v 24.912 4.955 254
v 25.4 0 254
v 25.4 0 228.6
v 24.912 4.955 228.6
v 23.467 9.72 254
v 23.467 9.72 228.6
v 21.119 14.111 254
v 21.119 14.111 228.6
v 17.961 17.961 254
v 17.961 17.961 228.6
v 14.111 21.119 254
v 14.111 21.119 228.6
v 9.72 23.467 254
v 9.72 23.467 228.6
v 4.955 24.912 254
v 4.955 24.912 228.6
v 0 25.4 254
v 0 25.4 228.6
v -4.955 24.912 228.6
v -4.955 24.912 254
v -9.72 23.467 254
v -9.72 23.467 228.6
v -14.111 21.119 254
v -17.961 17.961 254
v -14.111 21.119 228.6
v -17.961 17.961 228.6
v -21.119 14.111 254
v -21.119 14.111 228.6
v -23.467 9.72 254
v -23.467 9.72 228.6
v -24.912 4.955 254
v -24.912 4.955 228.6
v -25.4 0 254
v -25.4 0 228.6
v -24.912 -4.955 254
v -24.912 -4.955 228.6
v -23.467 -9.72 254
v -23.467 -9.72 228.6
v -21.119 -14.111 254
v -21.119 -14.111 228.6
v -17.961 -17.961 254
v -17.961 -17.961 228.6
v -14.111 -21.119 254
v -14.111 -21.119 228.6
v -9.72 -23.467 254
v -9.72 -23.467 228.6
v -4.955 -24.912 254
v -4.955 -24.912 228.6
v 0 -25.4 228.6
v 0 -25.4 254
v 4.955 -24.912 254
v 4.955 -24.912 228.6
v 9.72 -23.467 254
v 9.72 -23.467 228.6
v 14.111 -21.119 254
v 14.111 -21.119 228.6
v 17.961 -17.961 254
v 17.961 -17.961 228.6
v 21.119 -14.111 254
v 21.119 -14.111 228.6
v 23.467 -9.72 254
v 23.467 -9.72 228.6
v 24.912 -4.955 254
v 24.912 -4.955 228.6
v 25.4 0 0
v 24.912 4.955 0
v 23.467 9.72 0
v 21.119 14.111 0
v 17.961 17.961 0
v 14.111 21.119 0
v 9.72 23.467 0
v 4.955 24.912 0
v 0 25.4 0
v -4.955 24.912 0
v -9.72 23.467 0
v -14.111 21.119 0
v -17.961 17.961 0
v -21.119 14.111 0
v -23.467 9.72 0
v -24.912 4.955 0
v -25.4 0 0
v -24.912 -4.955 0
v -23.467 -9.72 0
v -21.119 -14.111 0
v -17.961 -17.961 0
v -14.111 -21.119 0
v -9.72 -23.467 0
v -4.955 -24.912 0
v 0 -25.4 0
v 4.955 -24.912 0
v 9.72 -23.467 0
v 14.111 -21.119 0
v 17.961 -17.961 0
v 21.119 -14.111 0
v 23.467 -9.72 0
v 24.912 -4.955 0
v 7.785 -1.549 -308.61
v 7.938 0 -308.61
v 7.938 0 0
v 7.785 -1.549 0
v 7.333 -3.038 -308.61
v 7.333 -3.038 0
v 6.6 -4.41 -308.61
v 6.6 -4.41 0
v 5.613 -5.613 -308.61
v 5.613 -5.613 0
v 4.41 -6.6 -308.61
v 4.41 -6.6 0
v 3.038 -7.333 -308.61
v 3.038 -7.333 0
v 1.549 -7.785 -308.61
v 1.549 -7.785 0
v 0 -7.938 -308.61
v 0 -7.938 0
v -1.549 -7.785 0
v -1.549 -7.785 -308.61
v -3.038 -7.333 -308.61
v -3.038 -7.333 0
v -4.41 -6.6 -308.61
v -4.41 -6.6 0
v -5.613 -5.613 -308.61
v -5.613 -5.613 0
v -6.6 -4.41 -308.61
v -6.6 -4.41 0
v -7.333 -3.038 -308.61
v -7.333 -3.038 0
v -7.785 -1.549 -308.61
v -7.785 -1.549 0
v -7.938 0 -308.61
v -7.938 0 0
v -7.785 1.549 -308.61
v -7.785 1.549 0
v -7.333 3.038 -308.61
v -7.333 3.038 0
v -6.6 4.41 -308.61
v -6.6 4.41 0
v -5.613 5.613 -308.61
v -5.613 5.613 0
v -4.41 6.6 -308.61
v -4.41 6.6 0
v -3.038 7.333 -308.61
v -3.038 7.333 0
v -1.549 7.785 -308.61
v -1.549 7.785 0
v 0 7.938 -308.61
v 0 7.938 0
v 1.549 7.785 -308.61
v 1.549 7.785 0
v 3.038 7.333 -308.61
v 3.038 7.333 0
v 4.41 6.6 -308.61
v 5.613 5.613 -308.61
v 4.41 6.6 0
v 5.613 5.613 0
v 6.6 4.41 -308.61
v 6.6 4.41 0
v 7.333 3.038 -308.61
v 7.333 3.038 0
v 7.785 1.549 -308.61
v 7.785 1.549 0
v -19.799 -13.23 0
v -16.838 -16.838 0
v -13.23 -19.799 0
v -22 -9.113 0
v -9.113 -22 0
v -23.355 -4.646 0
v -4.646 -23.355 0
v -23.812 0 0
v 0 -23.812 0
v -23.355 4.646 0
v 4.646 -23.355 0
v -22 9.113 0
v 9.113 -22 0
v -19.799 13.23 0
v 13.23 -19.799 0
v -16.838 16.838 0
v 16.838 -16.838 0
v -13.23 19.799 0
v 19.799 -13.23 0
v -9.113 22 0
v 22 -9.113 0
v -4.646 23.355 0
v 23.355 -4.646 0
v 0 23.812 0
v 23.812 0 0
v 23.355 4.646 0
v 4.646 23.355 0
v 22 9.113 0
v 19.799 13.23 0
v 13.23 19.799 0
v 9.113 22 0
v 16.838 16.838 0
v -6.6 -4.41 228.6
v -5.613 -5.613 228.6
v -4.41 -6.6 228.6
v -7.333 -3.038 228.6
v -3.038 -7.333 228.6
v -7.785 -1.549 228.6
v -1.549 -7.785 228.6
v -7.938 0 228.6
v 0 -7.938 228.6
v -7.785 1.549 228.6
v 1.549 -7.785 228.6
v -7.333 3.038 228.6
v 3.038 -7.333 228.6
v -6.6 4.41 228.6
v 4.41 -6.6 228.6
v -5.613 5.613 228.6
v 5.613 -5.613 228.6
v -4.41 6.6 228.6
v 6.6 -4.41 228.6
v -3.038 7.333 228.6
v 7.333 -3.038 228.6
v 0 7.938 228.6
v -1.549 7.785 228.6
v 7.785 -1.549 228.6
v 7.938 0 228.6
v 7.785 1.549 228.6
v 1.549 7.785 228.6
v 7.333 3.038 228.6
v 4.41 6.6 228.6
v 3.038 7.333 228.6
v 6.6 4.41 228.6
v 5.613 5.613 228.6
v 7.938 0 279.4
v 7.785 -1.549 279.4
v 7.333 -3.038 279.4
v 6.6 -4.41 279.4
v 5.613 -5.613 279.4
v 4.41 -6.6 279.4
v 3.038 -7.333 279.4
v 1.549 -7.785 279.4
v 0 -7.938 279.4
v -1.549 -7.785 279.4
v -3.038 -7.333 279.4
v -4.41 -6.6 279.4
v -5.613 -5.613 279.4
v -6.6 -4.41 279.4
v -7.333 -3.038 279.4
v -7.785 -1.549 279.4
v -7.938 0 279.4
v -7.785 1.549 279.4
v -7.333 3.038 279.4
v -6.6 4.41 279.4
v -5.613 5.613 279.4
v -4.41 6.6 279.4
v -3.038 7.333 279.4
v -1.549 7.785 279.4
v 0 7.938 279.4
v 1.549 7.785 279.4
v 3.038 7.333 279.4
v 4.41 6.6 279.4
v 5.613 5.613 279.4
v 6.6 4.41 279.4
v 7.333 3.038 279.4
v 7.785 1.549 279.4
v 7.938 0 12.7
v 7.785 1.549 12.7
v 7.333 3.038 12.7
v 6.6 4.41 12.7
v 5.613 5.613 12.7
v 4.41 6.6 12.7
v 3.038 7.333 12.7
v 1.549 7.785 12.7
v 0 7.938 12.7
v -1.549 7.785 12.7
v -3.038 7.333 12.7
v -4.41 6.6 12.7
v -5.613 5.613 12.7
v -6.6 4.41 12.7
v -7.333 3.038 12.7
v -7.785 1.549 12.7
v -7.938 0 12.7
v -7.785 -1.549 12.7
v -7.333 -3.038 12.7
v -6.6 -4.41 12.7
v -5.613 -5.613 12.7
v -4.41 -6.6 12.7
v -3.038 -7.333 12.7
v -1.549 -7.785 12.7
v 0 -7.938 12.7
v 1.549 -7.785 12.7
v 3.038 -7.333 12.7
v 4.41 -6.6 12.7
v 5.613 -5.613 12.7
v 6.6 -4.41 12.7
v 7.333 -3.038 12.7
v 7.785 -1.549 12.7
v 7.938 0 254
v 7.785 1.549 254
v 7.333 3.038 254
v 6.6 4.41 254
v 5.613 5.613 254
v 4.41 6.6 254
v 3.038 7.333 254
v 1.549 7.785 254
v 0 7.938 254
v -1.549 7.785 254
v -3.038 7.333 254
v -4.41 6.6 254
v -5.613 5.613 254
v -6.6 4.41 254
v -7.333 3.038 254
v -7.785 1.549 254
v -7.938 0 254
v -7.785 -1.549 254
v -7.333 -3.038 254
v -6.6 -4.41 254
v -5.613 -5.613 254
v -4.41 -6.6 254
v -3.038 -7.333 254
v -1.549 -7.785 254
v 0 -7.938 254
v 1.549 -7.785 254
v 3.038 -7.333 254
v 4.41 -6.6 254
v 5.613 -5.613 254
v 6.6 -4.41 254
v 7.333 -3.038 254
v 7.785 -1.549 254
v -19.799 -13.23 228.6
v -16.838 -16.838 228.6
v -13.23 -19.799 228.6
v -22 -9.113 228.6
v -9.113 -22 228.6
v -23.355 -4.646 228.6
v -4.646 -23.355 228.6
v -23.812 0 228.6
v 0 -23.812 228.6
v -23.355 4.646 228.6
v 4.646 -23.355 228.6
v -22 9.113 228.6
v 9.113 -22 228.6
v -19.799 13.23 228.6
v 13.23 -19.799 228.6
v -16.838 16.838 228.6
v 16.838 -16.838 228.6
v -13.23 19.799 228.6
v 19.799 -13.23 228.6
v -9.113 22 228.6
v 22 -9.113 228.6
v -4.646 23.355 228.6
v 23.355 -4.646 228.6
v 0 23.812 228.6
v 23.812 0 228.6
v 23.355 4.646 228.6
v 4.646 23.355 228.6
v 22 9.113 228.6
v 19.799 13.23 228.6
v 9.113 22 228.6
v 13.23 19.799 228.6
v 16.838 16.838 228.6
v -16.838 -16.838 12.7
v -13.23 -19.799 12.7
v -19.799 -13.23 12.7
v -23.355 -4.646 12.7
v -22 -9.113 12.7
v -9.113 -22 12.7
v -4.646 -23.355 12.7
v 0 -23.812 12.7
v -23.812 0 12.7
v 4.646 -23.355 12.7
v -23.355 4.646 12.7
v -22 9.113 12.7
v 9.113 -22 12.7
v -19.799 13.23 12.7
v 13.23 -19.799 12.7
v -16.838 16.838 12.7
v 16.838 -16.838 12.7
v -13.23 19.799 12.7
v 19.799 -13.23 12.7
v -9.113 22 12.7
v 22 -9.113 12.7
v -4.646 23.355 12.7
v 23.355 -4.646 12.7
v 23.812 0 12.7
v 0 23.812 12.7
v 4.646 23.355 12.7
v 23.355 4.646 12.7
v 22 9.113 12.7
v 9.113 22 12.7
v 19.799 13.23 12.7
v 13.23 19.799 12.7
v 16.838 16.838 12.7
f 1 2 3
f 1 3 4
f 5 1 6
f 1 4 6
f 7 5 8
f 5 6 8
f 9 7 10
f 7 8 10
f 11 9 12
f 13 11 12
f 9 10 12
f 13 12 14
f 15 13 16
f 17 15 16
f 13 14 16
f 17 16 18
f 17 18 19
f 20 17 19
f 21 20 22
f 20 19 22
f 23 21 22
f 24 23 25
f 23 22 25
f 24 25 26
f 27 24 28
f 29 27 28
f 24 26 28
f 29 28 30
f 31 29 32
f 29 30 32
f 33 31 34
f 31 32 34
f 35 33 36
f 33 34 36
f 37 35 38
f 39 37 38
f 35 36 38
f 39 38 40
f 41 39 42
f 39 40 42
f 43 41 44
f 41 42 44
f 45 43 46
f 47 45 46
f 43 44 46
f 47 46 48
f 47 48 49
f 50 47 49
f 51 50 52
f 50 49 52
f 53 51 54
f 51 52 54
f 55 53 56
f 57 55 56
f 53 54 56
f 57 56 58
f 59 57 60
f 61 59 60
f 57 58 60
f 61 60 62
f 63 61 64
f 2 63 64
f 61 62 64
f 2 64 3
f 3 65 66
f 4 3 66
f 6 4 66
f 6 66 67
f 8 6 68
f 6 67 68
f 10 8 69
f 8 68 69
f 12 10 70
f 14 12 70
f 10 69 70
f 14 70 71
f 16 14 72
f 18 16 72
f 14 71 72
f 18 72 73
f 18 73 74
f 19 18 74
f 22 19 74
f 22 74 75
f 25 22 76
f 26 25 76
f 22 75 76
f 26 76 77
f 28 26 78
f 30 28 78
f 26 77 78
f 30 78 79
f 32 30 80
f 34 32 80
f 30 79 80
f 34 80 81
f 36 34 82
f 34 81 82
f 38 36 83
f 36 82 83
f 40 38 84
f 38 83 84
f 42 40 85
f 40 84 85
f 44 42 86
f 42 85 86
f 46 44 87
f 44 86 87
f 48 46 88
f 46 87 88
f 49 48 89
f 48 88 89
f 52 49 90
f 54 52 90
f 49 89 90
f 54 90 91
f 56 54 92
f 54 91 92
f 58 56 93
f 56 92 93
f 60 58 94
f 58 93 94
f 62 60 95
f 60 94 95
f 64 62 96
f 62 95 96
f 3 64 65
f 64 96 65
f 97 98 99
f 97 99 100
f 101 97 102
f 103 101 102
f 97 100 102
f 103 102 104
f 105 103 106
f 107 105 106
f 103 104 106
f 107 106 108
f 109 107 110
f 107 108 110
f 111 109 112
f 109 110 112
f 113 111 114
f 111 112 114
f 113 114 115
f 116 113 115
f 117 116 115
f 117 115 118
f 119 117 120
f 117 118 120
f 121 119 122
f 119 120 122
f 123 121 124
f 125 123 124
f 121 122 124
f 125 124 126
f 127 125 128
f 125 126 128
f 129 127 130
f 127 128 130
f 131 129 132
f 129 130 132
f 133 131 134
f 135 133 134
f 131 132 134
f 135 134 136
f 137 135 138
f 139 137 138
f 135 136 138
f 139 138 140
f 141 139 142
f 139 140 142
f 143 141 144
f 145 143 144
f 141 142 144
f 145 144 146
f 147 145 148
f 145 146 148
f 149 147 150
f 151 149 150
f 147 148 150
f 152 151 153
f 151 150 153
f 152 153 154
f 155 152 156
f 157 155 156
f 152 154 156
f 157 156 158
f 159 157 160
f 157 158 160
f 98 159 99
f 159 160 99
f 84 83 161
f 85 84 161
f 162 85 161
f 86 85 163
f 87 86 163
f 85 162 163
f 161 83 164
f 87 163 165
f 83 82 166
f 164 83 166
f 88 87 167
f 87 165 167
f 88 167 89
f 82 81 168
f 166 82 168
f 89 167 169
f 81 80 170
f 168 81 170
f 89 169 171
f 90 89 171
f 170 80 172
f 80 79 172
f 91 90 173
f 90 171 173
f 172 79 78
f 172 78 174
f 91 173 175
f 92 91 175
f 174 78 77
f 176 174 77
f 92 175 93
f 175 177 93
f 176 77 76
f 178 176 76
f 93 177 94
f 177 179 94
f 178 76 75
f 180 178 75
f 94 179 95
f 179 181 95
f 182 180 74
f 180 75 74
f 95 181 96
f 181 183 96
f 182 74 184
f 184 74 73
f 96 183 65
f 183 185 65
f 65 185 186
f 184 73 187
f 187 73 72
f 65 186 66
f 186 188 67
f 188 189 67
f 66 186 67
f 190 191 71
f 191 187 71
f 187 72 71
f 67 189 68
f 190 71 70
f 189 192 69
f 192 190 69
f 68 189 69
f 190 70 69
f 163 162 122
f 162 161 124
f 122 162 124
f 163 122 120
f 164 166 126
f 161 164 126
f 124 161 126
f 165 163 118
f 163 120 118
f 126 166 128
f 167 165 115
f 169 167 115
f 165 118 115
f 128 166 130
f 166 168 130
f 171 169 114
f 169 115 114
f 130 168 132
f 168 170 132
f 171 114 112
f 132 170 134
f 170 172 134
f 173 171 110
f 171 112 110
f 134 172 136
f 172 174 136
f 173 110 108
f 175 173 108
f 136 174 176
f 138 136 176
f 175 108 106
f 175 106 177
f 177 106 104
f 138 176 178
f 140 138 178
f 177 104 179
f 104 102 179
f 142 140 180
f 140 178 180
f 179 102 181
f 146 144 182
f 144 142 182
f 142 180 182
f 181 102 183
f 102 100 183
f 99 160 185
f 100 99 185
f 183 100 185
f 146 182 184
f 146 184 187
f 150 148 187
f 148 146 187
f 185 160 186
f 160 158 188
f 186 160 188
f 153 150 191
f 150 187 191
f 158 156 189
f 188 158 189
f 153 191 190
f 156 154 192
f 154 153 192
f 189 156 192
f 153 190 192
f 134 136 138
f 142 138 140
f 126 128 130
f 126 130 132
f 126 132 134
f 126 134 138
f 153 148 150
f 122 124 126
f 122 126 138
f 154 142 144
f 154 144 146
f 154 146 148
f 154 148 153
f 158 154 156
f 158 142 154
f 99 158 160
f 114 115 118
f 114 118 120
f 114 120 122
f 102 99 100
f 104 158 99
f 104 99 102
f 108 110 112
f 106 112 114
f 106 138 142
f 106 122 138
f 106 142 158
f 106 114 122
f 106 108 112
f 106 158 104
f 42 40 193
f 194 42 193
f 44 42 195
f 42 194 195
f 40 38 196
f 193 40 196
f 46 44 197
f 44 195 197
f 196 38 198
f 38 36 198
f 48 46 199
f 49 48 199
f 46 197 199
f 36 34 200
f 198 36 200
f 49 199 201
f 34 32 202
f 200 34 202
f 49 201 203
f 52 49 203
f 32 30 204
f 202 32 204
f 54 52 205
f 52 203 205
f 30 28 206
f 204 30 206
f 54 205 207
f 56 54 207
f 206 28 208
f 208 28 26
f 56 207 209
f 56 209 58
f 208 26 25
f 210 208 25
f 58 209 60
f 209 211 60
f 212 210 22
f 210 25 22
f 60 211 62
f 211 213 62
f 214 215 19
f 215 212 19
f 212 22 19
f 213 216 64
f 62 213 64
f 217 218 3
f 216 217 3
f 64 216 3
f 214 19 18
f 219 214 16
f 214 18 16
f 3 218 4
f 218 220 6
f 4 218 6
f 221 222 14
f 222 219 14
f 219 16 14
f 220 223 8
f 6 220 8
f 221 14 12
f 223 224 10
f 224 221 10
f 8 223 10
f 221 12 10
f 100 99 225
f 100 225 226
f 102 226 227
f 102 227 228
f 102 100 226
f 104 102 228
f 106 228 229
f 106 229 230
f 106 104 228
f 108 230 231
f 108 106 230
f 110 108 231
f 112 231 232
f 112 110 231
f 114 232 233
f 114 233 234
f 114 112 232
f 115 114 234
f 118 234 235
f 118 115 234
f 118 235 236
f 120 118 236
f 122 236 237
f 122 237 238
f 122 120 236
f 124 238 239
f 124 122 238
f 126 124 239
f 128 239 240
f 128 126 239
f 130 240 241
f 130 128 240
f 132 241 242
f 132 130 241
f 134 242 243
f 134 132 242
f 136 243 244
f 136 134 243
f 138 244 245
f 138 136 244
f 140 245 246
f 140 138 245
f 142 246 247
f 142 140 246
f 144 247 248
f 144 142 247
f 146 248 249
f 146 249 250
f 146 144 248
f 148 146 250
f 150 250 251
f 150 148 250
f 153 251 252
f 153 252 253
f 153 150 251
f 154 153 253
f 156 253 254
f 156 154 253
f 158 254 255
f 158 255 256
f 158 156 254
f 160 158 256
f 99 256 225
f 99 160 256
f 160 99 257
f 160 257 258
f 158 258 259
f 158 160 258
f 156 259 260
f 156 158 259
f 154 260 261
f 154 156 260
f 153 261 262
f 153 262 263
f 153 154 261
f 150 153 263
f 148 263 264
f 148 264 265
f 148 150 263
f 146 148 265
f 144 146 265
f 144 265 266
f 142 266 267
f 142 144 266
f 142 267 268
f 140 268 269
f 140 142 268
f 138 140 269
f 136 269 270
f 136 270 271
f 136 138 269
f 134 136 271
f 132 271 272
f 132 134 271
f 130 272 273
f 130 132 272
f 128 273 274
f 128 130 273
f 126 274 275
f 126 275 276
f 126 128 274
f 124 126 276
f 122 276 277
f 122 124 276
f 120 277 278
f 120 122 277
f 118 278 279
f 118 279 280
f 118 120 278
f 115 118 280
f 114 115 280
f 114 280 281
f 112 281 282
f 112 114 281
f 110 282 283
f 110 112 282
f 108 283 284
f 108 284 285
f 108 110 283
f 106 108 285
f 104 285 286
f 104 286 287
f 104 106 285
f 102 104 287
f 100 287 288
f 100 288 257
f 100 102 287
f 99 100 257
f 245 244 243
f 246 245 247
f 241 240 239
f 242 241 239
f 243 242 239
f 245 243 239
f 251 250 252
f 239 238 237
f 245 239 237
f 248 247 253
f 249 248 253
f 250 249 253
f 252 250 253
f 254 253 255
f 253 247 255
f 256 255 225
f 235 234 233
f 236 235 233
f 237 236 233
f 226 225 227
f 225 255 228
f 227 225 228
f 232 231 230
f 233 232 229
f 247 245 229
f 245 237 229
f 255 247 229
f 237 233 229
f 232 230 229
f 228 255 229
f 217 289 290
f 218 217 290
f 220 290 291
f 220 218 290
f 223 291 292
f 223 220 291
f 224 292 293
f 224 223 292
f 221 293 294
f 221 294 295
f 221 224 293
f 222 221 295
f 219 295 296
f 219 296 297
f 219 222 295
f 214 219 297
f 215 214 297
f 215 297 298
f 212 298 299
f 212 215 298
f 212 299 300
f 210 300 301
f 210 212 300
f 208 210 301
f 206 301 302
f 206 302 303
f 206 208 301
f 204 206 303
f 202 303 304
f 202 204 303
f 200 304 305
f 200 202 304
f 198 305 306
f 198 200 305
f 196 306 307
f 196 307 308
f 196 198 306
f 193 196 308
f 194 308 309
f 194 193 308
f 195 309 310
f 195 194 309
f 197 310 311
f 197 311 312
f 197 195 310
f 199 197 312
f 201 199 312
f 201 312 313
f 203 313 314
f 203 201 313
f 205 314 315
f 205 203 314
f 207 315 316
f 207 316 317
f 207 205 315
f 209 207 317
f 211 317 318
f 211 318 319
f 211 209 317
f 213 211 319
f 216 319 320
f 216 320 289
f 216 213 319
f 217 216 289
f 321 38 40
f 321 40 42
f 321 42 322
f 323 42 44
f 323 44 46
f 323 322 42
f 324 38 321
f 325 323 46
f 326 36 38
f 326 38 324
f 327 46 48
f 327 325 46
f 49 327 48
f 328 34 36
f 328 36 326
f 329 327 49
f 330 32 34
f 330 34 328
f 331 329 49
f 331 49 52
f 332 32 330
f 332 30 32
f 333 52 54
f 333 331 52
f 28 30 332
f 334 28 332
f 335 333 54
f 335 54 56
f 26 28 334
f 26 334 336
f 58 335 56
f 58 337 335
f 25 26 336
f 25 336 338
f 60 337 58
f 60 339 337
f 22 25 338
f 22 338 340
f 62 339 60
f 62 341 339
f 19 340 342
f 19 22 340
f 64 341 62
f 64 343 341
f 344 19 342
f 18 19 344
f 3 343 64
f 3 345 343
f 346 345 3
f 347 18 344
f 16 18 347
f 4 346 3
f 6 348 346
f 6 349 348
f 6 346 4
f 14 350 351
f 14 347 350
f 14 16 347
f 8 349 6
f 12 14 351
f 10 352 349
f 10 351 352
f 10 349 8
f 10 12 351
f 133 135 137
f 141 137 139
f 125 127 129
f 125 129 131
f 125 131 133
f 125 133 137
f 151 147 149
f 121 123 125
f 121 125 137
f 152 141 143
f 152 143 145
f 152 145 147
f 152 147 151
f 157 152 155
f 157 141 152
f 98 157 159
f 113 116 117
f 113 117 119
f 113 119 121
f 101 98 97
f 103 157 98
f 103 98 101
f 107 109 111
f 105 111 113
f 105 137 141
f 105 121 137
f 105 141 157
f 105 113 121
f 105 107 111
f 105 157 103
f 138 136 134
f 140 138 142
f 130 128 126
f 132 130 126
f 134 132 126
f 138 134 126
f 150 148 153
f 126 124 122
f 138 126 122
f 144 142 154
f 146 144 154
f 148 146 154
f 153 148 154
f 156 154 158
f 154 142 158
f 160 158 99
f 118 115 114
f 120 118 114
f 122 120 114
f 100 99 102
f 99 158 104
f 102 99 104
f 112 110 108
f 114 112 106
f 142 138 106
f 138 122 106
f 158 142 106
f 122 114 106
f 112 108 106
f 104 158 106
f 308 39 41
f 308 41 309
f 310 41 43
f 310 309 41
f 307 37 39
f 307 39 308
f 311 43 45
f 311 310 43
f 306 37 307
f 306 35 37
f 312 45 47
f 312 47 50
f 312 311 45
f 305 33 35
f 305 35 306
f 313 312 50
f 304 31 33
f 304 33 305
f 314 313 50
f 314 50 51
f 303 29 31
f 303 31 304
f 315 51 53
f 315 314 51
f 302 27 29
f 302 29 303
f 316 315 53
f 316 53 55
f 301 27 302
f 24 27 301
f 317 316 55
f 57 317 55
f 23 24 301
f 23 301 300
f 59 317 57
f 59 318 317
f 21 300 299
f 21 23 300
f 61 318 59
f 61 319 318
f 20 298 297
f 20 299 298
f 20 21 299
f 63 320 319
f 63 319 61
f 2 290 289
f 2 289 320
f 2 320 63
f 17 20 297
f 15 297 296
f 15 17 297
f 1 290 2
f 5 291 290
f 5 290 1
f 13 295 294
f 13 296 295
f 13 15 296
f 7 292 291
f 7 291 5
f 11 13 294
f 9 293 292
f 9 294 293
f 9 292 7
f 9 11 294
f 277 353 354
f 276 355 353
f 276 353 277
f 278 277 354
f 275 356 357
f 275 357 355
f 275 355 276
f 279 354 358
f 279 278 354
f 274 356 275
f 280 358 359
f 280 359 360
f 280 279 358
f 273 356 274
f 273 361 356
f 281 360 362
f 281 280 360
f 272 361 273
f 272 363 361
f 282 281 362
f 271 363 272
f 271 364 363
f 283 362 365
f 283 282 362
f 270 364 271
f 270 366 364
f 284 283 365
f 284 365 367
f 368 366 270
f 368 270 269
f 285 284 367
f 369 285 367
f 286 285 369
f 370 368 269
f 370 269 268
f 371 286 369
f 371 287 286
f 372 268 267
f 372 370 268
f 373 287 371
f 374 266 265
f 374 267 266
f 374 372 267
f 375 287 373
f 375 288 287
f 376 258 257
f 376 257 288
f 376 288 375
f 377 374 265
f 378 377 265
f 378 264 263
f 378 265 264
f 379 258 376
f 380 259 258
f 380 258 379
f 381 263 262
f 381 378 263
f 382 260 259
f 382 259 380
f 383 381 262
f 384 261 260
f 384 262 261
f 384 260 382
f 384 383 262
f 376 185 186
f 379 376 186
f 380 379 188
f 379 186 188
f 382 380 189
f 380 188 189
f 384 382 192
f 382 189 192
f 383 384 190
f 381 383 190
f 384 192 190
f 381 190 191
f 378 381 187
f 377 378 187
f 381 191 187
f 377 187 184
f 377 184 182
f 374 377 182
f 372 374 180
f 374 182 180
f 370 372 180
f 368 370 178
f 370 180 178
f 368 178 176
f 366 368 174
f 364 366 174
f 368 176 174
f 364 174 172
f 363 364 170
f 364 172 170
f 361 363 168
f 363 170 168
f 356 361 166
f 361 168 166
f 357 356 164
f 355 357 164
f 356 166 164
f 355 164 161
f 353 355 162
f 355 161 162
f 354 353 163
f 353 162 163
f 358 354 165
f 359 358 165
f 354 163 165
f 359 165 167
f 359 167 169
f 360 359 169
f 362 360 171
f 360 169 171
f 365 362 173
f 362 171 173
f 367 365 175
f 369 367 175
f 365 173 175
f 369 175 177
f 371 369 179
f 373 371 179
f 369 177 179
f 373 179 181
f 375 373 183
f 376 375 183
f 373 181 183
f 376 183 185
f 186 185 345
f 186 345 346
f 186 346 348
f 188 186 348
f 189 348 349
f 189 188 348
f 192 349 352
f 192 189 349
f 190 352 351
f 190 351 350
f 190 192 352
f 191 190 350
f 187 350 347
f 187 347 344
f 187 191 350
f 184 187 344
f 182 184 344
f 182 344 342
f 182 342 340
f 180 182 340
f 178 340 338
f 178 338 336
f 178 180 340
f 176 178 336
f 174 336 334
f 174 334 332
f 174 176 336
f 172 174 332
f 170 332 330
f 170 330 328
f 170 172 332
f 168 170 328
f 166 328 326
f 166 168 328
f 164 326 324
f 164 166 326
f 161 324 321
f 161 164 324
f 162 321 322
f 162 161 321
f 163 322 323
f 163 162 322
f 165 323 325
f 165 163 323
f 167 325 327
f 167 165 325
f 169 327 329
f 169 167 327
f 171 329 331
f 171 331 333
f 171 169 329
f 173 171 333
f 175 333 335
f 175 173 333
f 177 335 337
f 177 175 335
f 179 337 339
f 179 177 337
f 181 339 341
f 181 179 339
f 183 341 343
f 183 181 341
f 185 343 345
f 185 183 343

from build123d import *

# Parameters (mm, degrees)
F0_R     = 25.4
F0_R_2   = 23.8125
F1_DEPTH = 228.6
F2_R     = 25.4
F2_R_2   = 7.9375
F3_DEPTH = 25.4
F4_R     = 23.8125
F4_R_2   = 7.9375
F5_DEPTH = 12.7
F6_R     = 7.9375
F7_DEPTH = 279.4
F8_R     = 7.9375
F9_DEPTH = 308.61


with BuildPart() as f1:
    # F0 (on Top) → F1 (new body)
    with BuildSketch(Plane.XY):
        Circle(F0_R)
        Circle(F0_R_2, mode=Mode.SUBTRACT)
    extrude(amount=F1_DEPTH)


with BuildPart() as f3:
    # F2 (on face) → F3 (new body)
    with BuildSketch(Plane.XY.offset(228.6)):
        Circle(F2_R)
        Circle(F2_R_2, mode=Mode.SUBTRACT)
    extrude(amount=F3_DEPTH)


with BuildPart() as f5:
    # F4 (on Top) → F5 (new body)
    with BuildSketch(Plane.XY):
        Circle(F4_R)
        Circle(F4_R_2, mode=Mode.SUBTRACT)
    extrude(amount=F5_DEPTH)


with BuildPart() as f7:
    # F6 (on face) → F7 (new body)
    with BuildSketch(Plane(origin=(0, 0, 0), x_dir=(1, 0, 0), z_dir=(0, 0, -1))):
        Circle(F6_R)
    extrude(amount=-F7_DEPTH)


with BuildPart() as f9:
    # F8 (on face) → F9 (new body)
    with BuildSketch(Plane(origin=(0, 0, 0), x_dir=(1, 0, 0), z_dir=(0, 0, -1))):
        Circle(F8_R)
    extrude(amount=F9_DEPTH)


solid = Compound([f1.part, f3.part, f5.part, f7.part, f9.part])
